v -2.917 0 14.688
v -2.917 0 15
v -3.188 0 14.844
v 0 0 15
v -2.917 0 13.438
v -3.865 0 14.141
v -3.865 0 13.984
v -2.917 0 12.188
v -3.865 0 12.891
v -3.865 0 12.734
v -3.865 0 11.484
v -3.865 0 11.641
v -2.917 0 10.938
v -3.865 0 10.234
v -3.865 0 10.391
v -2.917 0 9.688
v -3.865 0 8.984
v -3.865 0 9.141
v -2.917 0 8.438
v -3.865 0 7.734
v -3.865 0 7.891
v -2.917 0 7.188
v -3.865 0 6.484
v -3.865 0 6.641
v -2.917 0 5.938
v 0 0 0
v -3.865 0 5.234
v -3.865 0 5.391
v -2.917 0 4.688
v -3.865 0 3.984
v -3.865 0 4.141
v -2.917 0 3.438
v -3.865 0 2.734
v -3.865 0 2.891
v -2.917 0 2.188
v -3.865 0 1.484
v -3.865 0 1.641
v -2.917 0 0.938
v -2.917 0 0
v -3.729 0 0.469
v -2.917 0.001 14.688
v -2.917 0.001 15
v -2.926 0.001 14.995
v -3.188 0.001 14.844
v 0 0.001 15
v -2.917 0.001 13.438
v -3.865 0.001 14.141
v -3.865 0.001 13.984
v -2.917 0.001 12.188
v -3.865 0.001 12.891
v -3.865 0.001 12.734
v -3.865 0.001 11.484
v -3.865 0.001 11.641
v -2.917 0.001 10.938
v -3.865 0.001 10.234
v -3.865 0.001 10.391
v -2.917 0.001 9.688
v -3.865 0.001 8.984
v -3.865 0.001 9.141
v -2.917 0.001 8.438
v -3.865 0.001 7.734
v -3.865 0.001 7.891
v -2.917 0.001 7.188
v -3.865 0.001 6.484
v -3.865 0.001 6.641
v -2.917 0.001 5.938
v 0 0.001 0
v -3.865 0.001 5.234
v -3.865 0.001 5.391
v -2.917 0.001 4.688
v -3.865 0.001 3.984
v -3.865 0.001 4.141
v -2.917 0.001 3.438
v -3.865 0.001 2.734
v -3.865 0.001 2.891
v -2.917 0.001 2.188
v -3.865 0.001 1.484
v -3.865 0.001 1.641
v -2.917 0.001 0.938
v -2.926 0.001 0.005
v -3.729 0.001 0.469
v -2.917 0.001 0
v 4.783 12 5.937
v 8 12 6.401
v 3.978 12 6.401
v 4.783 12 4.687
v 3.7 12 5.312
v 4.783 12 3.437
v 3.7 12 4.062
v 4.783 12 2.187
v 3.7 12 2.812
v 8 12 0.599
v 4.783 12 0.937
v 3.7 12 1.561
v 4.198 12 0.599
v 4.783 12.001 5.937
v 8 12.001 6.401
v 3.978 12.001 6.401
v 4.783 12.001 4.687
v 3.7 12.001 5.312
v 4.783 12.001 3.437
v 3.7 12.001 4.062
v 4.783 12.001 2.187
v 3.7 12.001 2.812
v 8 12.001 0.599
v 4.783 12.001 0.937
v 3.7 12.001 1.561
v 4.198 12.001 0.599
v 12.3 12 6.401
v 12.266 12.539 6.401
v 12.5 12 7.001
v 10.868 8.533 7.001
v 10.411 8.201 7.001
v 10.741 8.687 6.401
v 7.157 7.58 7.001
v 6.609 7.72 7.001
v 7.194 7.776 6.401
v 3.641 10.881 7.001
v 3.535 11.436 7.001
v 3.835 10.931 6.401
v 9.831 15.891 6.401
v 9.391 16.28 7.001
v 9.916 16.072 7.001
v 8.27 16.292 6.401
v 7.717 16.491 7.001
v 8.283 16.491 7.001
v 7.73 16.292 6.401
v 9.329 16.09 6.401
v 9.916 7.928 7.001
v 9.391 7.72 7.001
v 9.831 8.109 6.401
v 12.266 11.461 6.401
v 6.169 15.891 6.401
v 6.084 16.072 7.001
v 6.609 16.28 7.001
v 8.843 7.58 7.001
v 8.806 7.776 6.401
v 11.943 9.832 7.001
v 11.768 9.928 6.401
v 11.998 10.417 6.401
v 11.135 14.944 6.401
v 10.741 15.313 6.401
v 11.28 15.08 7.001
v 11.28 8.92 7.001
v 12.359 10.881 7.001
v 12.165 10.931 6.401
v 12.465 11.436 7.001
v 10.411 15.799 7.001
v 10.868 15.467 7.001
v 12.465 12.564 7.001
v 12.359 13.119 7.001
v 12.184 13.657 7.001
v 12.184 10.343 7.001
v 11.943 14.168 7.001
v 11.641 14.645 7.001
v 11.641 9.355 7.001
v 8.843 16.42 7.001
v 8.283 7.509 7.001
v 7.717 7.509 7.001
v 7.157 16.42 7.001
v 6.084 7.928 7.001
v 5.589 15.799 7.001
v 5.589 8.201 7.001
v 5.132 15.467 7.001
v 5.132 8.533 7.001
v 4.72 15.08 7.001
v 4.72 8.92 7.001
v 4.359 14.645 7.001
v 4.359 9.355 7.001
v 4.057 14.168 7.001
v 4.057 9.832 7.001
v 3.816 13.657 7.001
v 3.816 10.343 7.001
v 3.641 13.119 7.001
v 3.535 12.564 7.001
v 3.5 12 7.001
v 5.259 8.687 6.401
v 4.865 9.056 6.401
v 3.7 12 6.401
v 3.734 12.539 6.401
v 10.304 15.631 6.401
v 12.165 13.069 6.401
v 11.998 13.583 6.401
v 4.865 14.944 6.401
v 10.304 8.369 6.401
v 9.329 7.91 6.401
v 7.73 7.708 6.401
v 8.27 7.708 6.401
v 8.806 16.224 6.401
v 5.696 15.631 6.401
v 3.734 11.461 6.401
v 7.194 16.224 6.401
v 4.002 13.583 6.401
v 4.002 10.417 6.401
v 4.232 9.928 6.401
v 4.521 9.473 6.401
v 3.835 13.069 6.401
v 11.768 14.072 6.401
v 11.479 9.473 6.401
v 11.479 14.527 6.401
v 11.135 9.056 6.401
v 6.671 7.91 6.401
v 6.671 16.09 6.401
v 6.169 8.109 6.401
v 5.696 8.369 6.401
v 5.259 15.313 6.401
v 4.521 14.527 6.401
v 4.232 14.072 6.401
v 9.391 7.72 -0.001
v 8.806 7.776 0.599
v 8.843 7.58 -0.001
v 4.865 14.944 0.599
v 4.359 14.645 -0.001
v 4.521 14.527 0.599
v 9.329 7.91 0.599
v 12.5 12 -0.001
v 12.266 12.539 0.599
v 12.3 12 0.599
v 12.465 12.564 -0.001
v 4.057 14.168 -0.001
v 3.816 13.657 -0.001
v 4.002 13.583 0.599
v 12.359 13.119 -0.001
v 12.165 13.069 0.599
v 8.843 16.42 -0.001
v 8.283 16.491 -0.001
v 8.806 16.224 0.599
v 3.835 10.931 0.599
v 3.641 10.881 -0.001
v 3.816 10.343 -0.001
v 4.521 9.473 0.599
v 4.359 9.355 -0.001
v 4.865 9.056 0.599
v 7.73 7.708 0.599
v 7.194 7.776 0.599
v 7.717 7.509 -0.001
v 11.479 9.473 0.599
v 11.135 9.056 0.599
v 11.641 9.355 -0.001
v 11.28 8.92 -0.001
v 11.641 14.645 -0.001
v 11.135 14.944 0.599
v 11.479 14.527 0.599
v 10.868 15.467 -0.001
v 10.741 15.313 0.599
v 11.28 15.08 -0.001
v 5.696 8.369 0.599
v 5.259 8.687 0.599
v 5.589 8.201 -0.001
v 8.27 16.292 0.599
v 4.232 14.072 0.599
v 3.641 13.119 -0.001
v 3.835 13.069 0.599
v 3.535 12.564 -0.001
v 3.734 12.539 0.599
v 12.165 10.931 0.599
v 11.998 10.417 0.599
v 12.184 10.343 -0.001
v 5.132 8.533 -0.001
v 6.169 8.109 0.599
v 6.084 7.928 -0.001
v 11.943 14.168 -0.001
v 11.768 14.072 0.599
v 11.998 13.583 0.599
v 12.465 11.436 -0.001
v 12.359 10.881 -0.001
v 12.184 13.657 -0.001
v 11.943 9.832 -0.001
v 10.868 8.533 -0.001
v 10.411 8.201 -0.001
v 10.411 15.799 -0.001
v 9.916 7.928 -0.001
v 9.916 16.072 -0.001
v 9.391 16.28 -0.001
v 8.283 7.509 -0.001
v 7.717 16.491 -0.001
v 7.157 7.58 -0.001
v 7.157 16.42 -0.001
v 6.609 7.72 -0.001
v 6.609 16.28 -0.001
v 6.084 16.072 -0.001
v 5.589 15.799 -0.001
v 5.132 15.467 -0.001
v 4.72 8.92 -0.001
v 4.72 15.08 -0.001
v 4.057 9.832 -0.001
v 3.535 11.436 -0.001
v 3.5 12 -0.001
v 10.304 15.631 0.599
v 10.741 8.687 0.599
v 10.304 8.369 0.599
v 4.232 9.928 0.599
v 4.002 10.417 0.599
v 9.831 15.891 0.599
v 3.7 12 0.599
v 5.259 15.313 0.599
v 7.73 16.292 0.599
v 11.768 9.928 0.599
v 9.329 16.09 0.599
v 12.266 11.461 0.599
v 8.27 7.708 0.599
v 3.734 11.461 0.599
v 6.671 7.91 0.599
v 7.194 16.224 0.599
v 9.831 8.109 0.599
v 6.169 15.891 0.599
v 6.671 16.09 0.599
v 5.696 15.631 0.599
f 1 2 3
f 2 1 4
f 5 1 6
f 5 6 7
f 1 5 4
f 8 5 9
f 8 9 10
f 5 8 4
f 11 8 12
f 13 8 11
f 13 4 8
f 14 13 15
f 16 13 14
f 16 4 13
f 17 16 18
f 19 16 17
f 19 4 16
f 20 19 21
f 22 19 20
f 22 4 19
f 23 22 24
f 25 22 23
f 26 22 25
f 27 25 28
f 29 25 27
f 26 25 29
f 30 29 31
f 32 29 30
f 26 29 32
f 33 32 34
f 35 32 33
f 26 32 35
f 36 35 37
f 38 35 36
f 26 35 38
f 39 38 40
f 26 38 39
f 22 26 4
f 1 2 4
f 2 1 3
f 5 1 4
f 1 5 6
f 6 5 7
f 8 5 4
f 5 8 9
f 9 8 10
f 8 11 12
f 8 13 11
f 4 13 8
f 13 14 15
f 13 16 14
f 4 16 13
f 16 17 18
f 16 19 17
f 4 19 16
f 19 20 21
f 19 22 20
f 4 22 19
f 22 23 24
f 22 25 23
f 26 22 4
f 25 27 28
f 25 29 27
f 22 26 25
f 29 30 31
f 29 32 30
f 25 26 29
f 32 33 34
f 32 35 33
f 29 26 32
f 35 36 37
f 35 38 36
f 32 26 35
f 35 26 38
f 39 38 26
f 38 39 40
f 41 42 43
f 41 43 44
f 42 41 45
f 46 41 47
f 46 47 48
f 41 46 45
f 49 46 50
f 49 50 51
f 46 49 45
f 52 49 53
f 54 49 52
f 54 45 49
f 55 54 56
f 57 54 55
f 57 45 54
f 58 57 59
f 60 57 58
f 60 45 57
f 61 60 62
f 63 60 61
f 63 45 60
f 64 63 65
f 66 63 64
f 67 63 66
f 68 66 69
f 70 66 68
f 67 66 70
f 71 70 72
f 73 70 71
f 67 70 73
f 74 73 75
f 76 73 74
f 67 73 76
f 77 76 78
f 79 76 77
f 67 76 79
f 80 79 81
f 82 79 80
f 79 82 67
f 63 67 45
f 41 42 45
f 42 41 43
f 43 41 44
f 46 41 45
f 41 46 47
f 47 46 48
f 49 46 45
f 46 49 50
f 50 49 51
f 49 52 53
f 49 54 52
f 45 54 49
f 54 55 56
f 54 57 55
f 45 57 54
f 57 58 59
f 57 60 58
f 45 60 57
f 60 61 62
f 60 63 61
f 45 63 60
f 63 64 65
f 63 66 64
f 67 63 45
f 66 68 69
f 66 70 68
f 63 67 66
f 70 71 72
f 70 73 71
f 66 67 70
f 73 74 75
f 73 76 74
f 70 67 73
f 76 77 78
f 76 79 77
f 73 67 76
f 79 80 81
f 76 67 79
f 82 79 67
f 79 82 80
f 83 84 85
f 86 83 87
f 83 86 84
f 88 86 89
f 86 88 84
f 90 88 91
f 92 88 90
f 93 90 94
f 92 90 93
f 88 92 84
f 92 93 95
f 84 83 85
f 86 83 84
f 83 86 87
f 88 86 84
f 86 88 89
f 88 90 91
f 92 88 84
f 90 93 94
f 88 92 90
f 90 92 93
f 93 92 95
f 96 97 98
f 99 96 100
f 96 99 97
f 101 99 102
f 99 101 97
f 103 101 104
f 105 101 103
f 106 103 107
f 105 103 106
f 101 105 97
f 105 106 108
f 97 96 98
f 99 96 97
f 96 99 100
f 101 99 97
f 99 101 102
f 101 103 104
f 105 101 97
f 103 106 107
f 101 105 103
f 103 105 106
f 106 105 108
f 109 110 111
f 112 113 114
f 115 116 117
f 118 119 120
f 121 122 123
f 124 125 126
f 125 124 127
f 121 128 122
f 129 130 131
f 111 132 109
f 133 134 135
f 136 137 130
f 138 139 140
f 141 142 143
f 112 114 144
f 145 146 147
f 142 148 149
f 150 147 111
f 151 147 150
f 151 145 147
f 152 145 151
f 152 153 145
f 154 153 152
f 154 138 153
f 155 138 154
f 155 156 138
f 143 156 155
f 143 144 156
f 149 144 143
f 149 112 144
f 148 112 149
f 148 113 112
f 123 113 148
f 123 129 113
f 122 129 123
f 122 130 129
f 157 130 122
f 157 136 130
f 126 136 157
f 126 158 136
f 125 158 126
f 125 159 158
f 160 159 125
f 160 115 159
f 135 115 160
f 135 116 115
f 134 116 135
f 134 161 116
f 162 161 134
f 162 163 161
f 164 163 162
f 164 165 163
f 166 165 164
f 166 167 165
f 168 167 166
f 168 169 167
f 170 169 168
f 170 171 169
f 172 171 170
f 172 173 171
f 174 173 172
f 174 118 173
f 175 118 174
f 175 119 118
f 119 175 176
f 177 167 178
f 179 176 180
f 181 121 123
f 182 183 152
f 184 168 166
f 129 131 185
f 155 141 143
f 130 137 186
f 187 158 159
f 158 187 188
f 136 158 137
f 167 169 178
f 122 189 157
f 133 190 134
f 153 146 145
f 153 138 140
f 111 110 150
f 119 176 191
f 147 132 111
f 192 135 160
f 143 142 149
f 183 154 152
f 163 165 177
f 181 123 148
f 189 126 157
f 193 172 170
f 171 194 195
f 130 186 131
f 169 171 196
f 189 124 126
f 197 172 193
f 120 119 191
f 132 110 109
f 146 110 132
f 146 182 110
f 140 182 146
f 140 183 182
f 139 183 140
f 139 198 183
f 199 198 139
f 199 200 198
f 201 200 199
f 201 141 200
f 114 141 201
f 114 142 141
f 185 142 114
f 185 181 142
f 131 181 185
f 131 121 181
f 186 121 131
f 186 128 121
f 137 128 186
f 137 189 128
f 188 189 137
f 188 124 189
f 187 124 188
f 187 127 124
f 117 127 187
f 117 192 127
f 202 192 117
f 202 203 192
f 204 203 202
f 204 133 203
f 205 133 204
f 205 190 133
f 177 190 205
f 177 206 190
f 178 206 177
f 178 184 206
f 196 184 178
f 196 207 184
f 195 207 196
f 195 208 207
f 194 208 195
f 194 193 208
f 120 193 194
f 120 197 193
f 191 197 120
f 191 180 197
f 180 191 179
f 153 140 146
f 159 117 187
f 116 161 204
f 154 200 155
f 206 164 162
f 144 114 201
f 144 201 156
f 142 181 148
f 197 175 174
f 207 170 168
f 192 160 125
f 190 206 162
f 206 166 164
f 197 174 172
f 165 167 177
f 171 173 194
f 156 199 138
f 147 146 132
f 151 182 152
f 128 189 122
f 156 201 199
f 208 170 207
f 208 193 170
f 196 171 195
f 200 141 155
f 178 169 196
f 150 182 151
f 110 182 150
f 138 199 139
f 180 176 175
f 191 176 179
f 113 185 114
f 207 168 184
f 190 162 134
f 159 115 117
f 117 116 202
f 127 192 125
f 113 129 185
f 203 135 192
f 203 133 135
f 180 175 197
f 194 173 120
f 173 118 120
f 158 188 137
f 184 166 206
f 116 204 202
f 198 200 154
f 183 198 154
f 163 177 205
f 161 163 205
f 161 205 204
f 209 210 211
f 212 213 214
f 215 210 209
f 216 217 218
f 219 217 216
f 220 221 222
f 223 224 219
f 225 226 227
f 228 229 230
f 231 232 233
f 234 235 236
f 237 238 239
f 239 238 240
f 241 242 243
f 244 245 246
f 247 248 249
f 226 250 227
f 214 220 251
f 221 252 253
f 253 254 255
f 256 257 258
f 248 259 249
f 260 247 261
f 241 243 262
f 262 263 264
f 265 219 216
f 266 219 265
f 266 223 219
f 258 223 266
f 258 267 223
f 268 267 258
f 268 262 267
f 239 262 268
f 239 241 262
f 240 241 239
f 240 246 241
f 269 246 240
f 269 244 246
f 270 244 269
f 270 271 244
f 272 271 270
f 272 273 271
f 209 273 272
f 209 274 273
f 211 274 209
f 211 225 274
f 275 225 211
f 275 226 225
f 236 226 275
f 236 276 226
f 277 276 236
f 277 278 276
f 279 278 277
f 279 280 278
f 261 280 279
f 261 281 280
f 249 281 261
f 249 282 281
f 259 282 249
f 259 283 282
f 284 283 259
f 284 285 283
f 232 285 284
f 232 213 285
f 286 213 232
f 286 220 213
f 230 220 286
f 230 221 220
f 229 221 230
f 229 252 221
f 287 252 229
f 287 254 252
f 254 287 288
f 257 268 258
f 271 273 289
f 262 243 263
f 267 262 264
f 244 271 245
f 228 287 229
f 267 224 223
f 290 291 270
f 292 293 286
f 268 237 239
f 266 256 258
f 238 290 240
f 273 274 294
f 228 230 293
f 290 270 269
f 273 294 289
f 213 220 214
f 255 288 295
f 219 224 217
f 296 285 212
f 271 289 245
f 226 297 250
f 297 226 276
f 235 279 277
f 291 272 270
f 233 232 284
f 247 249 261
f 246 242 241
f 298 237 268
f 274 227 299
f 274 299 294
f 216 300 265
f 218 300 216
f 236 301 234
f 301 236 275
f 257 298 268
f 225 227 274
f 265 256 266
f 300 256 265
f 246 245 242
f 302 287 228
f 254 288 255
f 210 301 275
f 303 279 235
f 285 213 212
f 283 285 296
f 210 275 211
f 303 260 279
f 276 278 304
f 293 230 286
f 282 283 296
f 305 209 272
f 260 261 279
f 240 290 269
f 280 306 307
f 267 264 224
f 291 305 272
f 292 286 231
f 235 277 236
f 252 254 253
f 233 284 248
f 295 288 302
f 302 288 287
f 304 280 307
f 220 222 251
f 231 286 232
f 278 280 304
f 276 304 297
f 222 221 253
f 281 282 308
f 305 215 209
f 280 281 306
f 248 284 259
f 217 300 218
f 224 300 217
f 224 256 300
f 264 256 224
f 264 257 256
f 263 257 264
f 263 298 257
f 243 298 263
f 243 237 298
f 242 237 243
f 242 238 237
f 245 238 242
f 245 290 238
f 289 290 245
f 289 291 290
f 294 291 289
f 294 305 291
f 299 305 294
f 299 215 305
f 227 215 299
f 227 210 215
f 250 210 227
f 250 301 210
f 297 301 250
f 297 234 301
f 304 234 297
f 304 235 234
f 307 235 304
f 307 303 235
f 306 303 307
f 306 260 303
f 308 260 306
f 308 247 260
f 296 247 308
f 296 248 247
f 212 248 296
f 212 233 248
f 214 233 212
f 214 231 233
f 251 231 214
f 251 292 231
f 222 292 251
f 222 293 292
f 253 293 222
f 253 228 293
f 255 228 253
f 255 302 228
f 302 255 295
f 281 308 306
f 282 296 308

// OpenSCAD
/*
"OpenScad library. Threads for screws and nuts V1" 
by ANDRES ROMAN (AKA Cuiso) September 2018

-> V1.1 23/08/2019 Change Log:
-Fixed bug. Using fullparms functions with "divs" no divider of 360 (200 for example) the thread could be incomplete. Now you can use any number of "divs" without problem.
-A small improvement. Now the diameter reductions at the beginning of the screw for easy entry are created with the same level of detail as the rest of the screw.

* Copyright 2018 ANDRES ROMAN (AKA Cuiso)
* Licensed under the Creative Commons - Attribution license.
* This software is free software, you can Share and Adapt under the terms of Attribution
(give appropriate credit).
*   
* you can visit https://creativecommons.org/licenses/by/3.0/ for more details

* This software is distributed WITHOUT ANY WARRANTY.

*/

//For use this library you can put the file threads-library-by-cuiso-v1.scad in the same directory of your proyect and put the line use <threads-library-by-cuiso-v1.scad> in your own .scad file
//You can see examples of use in file examples.scad

/*
This is a library to include threads for screws and nuts in your own designs.

This library is focused to provide simple functions with preset parameters by default,
and not to be too demanding in CPU consumption neither in previsualizacion nor in rendering

This library has been tested printing on PLA with 0.1 layer. Except for smaller diameter
threads layers greater than 0.1 should work well.
Diamaters tested between 3mm and 10mm, but you can use any diameter of your choice. 

Shape of the threads are similar (but not equal) to ISO METRIC threads.
Some tests have been done using screws and nuts printed with this library in
combination with screws and nuts of metal with acceptable results. However, they have
not been exhaustive tests.
*/

/*
>>>>>>>>>>>>>>>>>>>>>>>>>>>>>>>>>>>>>>>>>>>>>>>>>>>>>>
AVAILABLE FUNCTIONS:

BASIC FUNCTIONS (USING PREDEFINED PARAMETERS):

thread_for_screw(diameter, length);
    Generates a screw thread of the diameter indicated by the "diameter" parameter and of the length indicated by "length". This function uses standard pitch values depending on the diameter specified.
    diameter: Free value, in milimeters.
    length: Free value, in milimeters.
    
    Example:
    thread_for_screw(diameter=10, length=30);

thread_for_nut(diameter, length, usrclearance=0);
    Generates a nut thread of the diameter indicated by the "diameter" parameter and of the length indicated by "length". This function uses standard pitch values depending on the diameter specified.
    The generated thread can be subtracted from any element of your design using the operator "difference()", thus obtaining a thread where a screw will fit.
    This function uses standard clearance for adjustment between screw and nut depending on the diameter specified.
    diameter: Free value, in milimeters.
    length: Free value, in milimeters.
    usrclearance: (optional) If the screw fits too tight on the nut you can specify a positive correction value (try 0.1 for example).
    If the screw fits too loose in the nut you can specify a negative correction value (try -0.1 for example).
    
    Example:
    thread_for_nut(diameter=10, length=20);
    

MORE AVAILABLE FUNCTIONS (WITH ADDITIONAL PARAMETERS):

thread_for_screw_fullparm(diameter, length, pitch, divs=50);
    Generates a screw thread of the diameter indicated by the "diameter" parameter and of the length indicated by "length", with pitch indicated by "pitch", and a resolution indicated by "divs". 
    This function allows you to specify a non-standard "pitch" value.
    diameter: Free value, in milimeters.
    length: Free value, in milimeters.
    pitch: Pitch value.
    divs: (optional) you can obtain more or less resolution with parm. Higher values for more resolution (and more rendering time). Default value is 50.
        
    Example:
    thread_for_screw_fullparm(diameter=10, length=30, pitch=2, divs=60);

thread_for_nut_fullparm(diameter, length, usrclearance=0, pitch, divs=50, entry=1);
    Generates a nut thread with additional parameters:
    diameter: Free value, in milimeters.
    length: Free value, in milimeters.
    usrclearance: (optional) If the screw fits too tight on the nut you can specify a positive correction value (try 0.1 for example).
    If the screw fits too loose in the nut you can specify a negative correction value (try -0.1 for example).
    pitch: Pitch value.
    divs: (optional) you can obtain more or less resolution with parm. Higher values for more resolution (and more rendering time). Default value is 50.
    entry: By default, the nut threads include a wider entrance area at the beginning and end to facilitate the introduction of the screw and minimize "elephant foot" problems.
    Specify 1 in entry to use these zones and 0 to not use them.
    
    Example:
    thread_for_nut_fullparm(diameter=10,length=20,usrclearance=0.1,pitch=1.5,divs=60, entry=1);
>>>>>>>>>>>>>>>>>>>>>>>>>>>>>>>>>>>>>>>>>>>>>>>>>>>>>>
*/   

/*
>>>>>>>>>>>>>>>>>>>>>>>>>>>>>>>>>>>>>>>>>>>>>>>>>>>>>>
SOME NOTES:
- At first preview(F5) of the design may appear in console a lot of messages:
"PolySet has nonplanar faces. Attempting alternate construction"
simply ignore those messages, they are not a problem.

- I have no lag problems in preview(F5) mode during the test of this library. If you are suffering lag problems in preview you can try to un-comment the "render()" al lines 254 and 261.  

- This library uses by default PITCH values: 
  DIAMETER    PITCH_VALUE
  3mm        0.5mm
  4mm        0.7mm
  5mm        0.8mm
  6mm        1.0mm
  8mm        1.25mm
 10mm        1.5mm
 ...
 24mm        3.0mm
 (complete list defined at get_std_pitch(diam))
>>>>>>>>>>>>>>>>>>>>>>>>>>>>>>>>>>>>>>>>>>>>>>>>>>>>>>
*/


//EXAMPLE FOR CUSTOMIZER:
//1 to draw rod, 0 to not draw rod
drawrod=1; 
//1 to draw nut, 0 to not draw nut
drawnut=1;
diameter=8; 
lengthrod=15; 
lengthnut=7; 
//Example of USE, a rod SCREW:
if(drawrod==1)thread_for_screw(diameter=diameter, length=lengthrod);
//Example of USE, a FEMALE THREAD to be removed (with difference ()) from another figure:
if(drawnut==1)
translate([diameter,1.5*diameter,0]){
thread_for_nut(diameter=diameter, length=lengthnut);
}




//>>>>>>>>>>>>>>>>>>>>>>>>>>>>>>>>>>>>>>>>>>>>>>>>>>>>>>>>>>>>>>>>>>>>>>>>>>>>>>>>>>>
module thread_for_screw(diameter, length)
{
stdpitch=get_std_pitch(diameter);
thread_for_screw_cuiso_tec(diameter,length,stdpitch,200);
echo(diameter);echo(stdpitch);
}

module thread_for_nut(diameter, length, usrclearance=0)
{
stdpitch=get_std_pitch(diameter);
stdclearance=get_std_clearance(diameter);

thread_for_nut_cuiso_tec
(diameter+stdclearance+usrclearance,length,stdpitch,50,entry=1);
    
echo(diameter);echo(stdpitch);echo(stdclearance+usrclearance);
}

//>>>>>>>>>>>>>>>>>>>>>>>>>>>>>>>>>>>>>>>>>>>>>>>>>>>>>>>>>>>>>>>>>>>>>>>>>>>>>>>>>>>
module thread_for_screw_fullparm(diameter, length, pitch, divs=50)
{
if(divs<20) thread_for_screw_cuiso_tec(diameter,length,pitch,20);
    else if(divs>360) thread_for_screw_cuiso_tec(diameter,length,pitch,360);
        else thread_for_screw_cuiso_tec(diameter,length,pitch,divs);
}

module thread_for_nut_fullparm(diameter, length, usrclearance=0, pitch, divs=50, entry=1)
{
stdclearance=get_std_clearance(diameter);

if(divs<20)thread_for_nut_cuiso_tec
(diameter+stdclearance+usrclearance,length,pitch,20,entry=entry);
else
if(divs>360)thread_for_nut_cuiso_tec
(diameter+stdclearance+usrclearance,length,pitch,360,entry=entry);
else
thread_for_nut_cuiso_tec
(diameter+stdclearance+usrclearance,length,pitch,divs,entry=entry);
}

//>>>>>>>>>>>>>>>>>>>>>>>>>>>>>>>>>>>>>>>>>>>>>>>>>>>>>>>>>>>>>>>>>>>>>>>>>>>>>>>>>>>
function get_std_pitch(diam) = 
lookup(diam,[[3,0.5],[4,0.7],[5,0.8],[6,1.0],[8,1.25],[10,1.5],
[12,1.75],[14,2.0],[16,2.0],[18,2.5],[20,2.5],[22,2.5],[24,3.0]
]);

function get_std_clearance(diam) = 
lookup(diam,[[3,0.4],[4,0.4],[5,0.5],[6,0.6],[8,0.6],[10,0.6],
[12,0.7],[14,0.7],[16,0.7],[18,0.7],[20,0.8],[22,0.8],[24,0.8]
]);
//>>>>>>>>>>>>>>>>>>>>>>>>>>>>>>>>>>>>>>>>>>>>>>>>>>>>>>>>>>>>>>>>>>>>>>>>>>>>>>>>>>>
module thread_for_screw_cuiso_tec(diameter,lenght,pitch,divdelta){
delta=360/divdelta;
intersection(){
cubointter(long=lenght,pitch=pitch,diameter=diameter,divdeltacube=divdelta);
rosca(long=lenght,p=pitch,delta=delta,diameter=diameter);
}
//#cylinder(d=diameter,h=lenght,$fn=100);
}

module thread_for_nut_cuiso_tec(diameter,lenght,pitch,divdelta,entry){
delta=360/divdelta;
translate([0,0,-0.001])
intersection(){
rosca(long=lenght+0.002,p=pitch,delta=delta,diameter=diameter,nut=1);
cubointter_nut(lenght+0.002,pitch,diameter);
}
if(entry==1){translate([0,0,-0.001])cubointter_nut_entry(lenght+0.002,pitch,diameter,divdeltacube=divdelta);}
//#cylinder(d=diameter,h=lenght,$fn=100);
}

module cubointter(long,pitch,diameter,divdeltacube)
{
longcube=long-pitch;
translate([0,0,longcube/2+pitch/2])cube([diameter,diameter,longcube],center=true);
translate([0,0,longcube+pitch/2])
cylinder(d1=diameter,d2=diameter-2*pitch*0.866,h=pitch/2, $fn=divdeltacube);
cylinder(d2=diameter,d1=diameter-2*pitch*0.866,h=pitch/2, $fn=divdeltacube);
}

module cubointter_nut(long,pitch,diameter)
{
longcube=long;
translate([0,0,longcube/2])cube([diameter,diameter,longcube],center=true);
}

module cubointter_nut_entry(long,pitch,diameter,divdeltacube)
{
longcube=long-0.6;
translate([0,0,longcube])
cylinder(d2=diameter+0.4,d1=diameter,h=0.6, $fn=divdeltacube);
cylinder(d1=diameter+0.4,d2=diameter,h=0.6, $fn=divdeltacube);
}

module rosca(long,p,delta,diameter,nut=0)
{
vueltas=round(long/p+0.5)+1;
translate([0,0,-p/4])
for(v = [0 : 1 : vueltas-1])
translate([0,0,v*p])
vuelta(p=p,delta=delta,diameter=diameter,nut=nut);
}

module vuelta(p,delta,diameter,nut)
{
medio(p=p,delta=delta,diameter=diameter,nut=nut);

translate([0,0.001,0])
rotate([0,180,180])
medio(p=p,delta=delta,diameter=diameter,nut=nut);
}

module medio(p,delta,diameter,nut)
{
if(nut==1)
//render()
hull(){
for(k = [0 : delta : 180])
translate([0,0,k*p/360])rotate([0,0,k])pieza_nut(diameter=diameter, p=p);
translate([0,0,180*p/360])rotate([0,0,180])pieza_nut(diameter=diameter, p=p);
}
else
//render()
hull(){
for(k = [0 : delta : 180])
translate([0,0,k*p/360])rotate([0,0,k])pieza(diameter=diameter, p=p);
translate([0,0,180*p/360])rotate([0,0,180])pieza(diameter=diameter, p=p);
}
}

module pieza(diameter, p)
{
r=diameter/2;
h=p*0.866;
pp=p/2;
pm=-p/2;
hh=r-h;

polyhedron([
    [0,0,pp],[hh,0,pp],[r-h/8,0,p/16],[r-h/8,0,-p/16],[hh,0,pm],[0,0,pm]
    ], 
    [[0,1,2,3,4,5]]);
}

module pieza_nut(diameter, p)
{
r=diameter/2;
h=p*0.866;
pp=p/2;
pm=-p/2;
hh=r-h;
polyhedron([[0,0,pp],[hh,0,pp],[r,0,0],[hh,0,pm],[0,0,pm]], [[0,1,2,3,4]]);
}
